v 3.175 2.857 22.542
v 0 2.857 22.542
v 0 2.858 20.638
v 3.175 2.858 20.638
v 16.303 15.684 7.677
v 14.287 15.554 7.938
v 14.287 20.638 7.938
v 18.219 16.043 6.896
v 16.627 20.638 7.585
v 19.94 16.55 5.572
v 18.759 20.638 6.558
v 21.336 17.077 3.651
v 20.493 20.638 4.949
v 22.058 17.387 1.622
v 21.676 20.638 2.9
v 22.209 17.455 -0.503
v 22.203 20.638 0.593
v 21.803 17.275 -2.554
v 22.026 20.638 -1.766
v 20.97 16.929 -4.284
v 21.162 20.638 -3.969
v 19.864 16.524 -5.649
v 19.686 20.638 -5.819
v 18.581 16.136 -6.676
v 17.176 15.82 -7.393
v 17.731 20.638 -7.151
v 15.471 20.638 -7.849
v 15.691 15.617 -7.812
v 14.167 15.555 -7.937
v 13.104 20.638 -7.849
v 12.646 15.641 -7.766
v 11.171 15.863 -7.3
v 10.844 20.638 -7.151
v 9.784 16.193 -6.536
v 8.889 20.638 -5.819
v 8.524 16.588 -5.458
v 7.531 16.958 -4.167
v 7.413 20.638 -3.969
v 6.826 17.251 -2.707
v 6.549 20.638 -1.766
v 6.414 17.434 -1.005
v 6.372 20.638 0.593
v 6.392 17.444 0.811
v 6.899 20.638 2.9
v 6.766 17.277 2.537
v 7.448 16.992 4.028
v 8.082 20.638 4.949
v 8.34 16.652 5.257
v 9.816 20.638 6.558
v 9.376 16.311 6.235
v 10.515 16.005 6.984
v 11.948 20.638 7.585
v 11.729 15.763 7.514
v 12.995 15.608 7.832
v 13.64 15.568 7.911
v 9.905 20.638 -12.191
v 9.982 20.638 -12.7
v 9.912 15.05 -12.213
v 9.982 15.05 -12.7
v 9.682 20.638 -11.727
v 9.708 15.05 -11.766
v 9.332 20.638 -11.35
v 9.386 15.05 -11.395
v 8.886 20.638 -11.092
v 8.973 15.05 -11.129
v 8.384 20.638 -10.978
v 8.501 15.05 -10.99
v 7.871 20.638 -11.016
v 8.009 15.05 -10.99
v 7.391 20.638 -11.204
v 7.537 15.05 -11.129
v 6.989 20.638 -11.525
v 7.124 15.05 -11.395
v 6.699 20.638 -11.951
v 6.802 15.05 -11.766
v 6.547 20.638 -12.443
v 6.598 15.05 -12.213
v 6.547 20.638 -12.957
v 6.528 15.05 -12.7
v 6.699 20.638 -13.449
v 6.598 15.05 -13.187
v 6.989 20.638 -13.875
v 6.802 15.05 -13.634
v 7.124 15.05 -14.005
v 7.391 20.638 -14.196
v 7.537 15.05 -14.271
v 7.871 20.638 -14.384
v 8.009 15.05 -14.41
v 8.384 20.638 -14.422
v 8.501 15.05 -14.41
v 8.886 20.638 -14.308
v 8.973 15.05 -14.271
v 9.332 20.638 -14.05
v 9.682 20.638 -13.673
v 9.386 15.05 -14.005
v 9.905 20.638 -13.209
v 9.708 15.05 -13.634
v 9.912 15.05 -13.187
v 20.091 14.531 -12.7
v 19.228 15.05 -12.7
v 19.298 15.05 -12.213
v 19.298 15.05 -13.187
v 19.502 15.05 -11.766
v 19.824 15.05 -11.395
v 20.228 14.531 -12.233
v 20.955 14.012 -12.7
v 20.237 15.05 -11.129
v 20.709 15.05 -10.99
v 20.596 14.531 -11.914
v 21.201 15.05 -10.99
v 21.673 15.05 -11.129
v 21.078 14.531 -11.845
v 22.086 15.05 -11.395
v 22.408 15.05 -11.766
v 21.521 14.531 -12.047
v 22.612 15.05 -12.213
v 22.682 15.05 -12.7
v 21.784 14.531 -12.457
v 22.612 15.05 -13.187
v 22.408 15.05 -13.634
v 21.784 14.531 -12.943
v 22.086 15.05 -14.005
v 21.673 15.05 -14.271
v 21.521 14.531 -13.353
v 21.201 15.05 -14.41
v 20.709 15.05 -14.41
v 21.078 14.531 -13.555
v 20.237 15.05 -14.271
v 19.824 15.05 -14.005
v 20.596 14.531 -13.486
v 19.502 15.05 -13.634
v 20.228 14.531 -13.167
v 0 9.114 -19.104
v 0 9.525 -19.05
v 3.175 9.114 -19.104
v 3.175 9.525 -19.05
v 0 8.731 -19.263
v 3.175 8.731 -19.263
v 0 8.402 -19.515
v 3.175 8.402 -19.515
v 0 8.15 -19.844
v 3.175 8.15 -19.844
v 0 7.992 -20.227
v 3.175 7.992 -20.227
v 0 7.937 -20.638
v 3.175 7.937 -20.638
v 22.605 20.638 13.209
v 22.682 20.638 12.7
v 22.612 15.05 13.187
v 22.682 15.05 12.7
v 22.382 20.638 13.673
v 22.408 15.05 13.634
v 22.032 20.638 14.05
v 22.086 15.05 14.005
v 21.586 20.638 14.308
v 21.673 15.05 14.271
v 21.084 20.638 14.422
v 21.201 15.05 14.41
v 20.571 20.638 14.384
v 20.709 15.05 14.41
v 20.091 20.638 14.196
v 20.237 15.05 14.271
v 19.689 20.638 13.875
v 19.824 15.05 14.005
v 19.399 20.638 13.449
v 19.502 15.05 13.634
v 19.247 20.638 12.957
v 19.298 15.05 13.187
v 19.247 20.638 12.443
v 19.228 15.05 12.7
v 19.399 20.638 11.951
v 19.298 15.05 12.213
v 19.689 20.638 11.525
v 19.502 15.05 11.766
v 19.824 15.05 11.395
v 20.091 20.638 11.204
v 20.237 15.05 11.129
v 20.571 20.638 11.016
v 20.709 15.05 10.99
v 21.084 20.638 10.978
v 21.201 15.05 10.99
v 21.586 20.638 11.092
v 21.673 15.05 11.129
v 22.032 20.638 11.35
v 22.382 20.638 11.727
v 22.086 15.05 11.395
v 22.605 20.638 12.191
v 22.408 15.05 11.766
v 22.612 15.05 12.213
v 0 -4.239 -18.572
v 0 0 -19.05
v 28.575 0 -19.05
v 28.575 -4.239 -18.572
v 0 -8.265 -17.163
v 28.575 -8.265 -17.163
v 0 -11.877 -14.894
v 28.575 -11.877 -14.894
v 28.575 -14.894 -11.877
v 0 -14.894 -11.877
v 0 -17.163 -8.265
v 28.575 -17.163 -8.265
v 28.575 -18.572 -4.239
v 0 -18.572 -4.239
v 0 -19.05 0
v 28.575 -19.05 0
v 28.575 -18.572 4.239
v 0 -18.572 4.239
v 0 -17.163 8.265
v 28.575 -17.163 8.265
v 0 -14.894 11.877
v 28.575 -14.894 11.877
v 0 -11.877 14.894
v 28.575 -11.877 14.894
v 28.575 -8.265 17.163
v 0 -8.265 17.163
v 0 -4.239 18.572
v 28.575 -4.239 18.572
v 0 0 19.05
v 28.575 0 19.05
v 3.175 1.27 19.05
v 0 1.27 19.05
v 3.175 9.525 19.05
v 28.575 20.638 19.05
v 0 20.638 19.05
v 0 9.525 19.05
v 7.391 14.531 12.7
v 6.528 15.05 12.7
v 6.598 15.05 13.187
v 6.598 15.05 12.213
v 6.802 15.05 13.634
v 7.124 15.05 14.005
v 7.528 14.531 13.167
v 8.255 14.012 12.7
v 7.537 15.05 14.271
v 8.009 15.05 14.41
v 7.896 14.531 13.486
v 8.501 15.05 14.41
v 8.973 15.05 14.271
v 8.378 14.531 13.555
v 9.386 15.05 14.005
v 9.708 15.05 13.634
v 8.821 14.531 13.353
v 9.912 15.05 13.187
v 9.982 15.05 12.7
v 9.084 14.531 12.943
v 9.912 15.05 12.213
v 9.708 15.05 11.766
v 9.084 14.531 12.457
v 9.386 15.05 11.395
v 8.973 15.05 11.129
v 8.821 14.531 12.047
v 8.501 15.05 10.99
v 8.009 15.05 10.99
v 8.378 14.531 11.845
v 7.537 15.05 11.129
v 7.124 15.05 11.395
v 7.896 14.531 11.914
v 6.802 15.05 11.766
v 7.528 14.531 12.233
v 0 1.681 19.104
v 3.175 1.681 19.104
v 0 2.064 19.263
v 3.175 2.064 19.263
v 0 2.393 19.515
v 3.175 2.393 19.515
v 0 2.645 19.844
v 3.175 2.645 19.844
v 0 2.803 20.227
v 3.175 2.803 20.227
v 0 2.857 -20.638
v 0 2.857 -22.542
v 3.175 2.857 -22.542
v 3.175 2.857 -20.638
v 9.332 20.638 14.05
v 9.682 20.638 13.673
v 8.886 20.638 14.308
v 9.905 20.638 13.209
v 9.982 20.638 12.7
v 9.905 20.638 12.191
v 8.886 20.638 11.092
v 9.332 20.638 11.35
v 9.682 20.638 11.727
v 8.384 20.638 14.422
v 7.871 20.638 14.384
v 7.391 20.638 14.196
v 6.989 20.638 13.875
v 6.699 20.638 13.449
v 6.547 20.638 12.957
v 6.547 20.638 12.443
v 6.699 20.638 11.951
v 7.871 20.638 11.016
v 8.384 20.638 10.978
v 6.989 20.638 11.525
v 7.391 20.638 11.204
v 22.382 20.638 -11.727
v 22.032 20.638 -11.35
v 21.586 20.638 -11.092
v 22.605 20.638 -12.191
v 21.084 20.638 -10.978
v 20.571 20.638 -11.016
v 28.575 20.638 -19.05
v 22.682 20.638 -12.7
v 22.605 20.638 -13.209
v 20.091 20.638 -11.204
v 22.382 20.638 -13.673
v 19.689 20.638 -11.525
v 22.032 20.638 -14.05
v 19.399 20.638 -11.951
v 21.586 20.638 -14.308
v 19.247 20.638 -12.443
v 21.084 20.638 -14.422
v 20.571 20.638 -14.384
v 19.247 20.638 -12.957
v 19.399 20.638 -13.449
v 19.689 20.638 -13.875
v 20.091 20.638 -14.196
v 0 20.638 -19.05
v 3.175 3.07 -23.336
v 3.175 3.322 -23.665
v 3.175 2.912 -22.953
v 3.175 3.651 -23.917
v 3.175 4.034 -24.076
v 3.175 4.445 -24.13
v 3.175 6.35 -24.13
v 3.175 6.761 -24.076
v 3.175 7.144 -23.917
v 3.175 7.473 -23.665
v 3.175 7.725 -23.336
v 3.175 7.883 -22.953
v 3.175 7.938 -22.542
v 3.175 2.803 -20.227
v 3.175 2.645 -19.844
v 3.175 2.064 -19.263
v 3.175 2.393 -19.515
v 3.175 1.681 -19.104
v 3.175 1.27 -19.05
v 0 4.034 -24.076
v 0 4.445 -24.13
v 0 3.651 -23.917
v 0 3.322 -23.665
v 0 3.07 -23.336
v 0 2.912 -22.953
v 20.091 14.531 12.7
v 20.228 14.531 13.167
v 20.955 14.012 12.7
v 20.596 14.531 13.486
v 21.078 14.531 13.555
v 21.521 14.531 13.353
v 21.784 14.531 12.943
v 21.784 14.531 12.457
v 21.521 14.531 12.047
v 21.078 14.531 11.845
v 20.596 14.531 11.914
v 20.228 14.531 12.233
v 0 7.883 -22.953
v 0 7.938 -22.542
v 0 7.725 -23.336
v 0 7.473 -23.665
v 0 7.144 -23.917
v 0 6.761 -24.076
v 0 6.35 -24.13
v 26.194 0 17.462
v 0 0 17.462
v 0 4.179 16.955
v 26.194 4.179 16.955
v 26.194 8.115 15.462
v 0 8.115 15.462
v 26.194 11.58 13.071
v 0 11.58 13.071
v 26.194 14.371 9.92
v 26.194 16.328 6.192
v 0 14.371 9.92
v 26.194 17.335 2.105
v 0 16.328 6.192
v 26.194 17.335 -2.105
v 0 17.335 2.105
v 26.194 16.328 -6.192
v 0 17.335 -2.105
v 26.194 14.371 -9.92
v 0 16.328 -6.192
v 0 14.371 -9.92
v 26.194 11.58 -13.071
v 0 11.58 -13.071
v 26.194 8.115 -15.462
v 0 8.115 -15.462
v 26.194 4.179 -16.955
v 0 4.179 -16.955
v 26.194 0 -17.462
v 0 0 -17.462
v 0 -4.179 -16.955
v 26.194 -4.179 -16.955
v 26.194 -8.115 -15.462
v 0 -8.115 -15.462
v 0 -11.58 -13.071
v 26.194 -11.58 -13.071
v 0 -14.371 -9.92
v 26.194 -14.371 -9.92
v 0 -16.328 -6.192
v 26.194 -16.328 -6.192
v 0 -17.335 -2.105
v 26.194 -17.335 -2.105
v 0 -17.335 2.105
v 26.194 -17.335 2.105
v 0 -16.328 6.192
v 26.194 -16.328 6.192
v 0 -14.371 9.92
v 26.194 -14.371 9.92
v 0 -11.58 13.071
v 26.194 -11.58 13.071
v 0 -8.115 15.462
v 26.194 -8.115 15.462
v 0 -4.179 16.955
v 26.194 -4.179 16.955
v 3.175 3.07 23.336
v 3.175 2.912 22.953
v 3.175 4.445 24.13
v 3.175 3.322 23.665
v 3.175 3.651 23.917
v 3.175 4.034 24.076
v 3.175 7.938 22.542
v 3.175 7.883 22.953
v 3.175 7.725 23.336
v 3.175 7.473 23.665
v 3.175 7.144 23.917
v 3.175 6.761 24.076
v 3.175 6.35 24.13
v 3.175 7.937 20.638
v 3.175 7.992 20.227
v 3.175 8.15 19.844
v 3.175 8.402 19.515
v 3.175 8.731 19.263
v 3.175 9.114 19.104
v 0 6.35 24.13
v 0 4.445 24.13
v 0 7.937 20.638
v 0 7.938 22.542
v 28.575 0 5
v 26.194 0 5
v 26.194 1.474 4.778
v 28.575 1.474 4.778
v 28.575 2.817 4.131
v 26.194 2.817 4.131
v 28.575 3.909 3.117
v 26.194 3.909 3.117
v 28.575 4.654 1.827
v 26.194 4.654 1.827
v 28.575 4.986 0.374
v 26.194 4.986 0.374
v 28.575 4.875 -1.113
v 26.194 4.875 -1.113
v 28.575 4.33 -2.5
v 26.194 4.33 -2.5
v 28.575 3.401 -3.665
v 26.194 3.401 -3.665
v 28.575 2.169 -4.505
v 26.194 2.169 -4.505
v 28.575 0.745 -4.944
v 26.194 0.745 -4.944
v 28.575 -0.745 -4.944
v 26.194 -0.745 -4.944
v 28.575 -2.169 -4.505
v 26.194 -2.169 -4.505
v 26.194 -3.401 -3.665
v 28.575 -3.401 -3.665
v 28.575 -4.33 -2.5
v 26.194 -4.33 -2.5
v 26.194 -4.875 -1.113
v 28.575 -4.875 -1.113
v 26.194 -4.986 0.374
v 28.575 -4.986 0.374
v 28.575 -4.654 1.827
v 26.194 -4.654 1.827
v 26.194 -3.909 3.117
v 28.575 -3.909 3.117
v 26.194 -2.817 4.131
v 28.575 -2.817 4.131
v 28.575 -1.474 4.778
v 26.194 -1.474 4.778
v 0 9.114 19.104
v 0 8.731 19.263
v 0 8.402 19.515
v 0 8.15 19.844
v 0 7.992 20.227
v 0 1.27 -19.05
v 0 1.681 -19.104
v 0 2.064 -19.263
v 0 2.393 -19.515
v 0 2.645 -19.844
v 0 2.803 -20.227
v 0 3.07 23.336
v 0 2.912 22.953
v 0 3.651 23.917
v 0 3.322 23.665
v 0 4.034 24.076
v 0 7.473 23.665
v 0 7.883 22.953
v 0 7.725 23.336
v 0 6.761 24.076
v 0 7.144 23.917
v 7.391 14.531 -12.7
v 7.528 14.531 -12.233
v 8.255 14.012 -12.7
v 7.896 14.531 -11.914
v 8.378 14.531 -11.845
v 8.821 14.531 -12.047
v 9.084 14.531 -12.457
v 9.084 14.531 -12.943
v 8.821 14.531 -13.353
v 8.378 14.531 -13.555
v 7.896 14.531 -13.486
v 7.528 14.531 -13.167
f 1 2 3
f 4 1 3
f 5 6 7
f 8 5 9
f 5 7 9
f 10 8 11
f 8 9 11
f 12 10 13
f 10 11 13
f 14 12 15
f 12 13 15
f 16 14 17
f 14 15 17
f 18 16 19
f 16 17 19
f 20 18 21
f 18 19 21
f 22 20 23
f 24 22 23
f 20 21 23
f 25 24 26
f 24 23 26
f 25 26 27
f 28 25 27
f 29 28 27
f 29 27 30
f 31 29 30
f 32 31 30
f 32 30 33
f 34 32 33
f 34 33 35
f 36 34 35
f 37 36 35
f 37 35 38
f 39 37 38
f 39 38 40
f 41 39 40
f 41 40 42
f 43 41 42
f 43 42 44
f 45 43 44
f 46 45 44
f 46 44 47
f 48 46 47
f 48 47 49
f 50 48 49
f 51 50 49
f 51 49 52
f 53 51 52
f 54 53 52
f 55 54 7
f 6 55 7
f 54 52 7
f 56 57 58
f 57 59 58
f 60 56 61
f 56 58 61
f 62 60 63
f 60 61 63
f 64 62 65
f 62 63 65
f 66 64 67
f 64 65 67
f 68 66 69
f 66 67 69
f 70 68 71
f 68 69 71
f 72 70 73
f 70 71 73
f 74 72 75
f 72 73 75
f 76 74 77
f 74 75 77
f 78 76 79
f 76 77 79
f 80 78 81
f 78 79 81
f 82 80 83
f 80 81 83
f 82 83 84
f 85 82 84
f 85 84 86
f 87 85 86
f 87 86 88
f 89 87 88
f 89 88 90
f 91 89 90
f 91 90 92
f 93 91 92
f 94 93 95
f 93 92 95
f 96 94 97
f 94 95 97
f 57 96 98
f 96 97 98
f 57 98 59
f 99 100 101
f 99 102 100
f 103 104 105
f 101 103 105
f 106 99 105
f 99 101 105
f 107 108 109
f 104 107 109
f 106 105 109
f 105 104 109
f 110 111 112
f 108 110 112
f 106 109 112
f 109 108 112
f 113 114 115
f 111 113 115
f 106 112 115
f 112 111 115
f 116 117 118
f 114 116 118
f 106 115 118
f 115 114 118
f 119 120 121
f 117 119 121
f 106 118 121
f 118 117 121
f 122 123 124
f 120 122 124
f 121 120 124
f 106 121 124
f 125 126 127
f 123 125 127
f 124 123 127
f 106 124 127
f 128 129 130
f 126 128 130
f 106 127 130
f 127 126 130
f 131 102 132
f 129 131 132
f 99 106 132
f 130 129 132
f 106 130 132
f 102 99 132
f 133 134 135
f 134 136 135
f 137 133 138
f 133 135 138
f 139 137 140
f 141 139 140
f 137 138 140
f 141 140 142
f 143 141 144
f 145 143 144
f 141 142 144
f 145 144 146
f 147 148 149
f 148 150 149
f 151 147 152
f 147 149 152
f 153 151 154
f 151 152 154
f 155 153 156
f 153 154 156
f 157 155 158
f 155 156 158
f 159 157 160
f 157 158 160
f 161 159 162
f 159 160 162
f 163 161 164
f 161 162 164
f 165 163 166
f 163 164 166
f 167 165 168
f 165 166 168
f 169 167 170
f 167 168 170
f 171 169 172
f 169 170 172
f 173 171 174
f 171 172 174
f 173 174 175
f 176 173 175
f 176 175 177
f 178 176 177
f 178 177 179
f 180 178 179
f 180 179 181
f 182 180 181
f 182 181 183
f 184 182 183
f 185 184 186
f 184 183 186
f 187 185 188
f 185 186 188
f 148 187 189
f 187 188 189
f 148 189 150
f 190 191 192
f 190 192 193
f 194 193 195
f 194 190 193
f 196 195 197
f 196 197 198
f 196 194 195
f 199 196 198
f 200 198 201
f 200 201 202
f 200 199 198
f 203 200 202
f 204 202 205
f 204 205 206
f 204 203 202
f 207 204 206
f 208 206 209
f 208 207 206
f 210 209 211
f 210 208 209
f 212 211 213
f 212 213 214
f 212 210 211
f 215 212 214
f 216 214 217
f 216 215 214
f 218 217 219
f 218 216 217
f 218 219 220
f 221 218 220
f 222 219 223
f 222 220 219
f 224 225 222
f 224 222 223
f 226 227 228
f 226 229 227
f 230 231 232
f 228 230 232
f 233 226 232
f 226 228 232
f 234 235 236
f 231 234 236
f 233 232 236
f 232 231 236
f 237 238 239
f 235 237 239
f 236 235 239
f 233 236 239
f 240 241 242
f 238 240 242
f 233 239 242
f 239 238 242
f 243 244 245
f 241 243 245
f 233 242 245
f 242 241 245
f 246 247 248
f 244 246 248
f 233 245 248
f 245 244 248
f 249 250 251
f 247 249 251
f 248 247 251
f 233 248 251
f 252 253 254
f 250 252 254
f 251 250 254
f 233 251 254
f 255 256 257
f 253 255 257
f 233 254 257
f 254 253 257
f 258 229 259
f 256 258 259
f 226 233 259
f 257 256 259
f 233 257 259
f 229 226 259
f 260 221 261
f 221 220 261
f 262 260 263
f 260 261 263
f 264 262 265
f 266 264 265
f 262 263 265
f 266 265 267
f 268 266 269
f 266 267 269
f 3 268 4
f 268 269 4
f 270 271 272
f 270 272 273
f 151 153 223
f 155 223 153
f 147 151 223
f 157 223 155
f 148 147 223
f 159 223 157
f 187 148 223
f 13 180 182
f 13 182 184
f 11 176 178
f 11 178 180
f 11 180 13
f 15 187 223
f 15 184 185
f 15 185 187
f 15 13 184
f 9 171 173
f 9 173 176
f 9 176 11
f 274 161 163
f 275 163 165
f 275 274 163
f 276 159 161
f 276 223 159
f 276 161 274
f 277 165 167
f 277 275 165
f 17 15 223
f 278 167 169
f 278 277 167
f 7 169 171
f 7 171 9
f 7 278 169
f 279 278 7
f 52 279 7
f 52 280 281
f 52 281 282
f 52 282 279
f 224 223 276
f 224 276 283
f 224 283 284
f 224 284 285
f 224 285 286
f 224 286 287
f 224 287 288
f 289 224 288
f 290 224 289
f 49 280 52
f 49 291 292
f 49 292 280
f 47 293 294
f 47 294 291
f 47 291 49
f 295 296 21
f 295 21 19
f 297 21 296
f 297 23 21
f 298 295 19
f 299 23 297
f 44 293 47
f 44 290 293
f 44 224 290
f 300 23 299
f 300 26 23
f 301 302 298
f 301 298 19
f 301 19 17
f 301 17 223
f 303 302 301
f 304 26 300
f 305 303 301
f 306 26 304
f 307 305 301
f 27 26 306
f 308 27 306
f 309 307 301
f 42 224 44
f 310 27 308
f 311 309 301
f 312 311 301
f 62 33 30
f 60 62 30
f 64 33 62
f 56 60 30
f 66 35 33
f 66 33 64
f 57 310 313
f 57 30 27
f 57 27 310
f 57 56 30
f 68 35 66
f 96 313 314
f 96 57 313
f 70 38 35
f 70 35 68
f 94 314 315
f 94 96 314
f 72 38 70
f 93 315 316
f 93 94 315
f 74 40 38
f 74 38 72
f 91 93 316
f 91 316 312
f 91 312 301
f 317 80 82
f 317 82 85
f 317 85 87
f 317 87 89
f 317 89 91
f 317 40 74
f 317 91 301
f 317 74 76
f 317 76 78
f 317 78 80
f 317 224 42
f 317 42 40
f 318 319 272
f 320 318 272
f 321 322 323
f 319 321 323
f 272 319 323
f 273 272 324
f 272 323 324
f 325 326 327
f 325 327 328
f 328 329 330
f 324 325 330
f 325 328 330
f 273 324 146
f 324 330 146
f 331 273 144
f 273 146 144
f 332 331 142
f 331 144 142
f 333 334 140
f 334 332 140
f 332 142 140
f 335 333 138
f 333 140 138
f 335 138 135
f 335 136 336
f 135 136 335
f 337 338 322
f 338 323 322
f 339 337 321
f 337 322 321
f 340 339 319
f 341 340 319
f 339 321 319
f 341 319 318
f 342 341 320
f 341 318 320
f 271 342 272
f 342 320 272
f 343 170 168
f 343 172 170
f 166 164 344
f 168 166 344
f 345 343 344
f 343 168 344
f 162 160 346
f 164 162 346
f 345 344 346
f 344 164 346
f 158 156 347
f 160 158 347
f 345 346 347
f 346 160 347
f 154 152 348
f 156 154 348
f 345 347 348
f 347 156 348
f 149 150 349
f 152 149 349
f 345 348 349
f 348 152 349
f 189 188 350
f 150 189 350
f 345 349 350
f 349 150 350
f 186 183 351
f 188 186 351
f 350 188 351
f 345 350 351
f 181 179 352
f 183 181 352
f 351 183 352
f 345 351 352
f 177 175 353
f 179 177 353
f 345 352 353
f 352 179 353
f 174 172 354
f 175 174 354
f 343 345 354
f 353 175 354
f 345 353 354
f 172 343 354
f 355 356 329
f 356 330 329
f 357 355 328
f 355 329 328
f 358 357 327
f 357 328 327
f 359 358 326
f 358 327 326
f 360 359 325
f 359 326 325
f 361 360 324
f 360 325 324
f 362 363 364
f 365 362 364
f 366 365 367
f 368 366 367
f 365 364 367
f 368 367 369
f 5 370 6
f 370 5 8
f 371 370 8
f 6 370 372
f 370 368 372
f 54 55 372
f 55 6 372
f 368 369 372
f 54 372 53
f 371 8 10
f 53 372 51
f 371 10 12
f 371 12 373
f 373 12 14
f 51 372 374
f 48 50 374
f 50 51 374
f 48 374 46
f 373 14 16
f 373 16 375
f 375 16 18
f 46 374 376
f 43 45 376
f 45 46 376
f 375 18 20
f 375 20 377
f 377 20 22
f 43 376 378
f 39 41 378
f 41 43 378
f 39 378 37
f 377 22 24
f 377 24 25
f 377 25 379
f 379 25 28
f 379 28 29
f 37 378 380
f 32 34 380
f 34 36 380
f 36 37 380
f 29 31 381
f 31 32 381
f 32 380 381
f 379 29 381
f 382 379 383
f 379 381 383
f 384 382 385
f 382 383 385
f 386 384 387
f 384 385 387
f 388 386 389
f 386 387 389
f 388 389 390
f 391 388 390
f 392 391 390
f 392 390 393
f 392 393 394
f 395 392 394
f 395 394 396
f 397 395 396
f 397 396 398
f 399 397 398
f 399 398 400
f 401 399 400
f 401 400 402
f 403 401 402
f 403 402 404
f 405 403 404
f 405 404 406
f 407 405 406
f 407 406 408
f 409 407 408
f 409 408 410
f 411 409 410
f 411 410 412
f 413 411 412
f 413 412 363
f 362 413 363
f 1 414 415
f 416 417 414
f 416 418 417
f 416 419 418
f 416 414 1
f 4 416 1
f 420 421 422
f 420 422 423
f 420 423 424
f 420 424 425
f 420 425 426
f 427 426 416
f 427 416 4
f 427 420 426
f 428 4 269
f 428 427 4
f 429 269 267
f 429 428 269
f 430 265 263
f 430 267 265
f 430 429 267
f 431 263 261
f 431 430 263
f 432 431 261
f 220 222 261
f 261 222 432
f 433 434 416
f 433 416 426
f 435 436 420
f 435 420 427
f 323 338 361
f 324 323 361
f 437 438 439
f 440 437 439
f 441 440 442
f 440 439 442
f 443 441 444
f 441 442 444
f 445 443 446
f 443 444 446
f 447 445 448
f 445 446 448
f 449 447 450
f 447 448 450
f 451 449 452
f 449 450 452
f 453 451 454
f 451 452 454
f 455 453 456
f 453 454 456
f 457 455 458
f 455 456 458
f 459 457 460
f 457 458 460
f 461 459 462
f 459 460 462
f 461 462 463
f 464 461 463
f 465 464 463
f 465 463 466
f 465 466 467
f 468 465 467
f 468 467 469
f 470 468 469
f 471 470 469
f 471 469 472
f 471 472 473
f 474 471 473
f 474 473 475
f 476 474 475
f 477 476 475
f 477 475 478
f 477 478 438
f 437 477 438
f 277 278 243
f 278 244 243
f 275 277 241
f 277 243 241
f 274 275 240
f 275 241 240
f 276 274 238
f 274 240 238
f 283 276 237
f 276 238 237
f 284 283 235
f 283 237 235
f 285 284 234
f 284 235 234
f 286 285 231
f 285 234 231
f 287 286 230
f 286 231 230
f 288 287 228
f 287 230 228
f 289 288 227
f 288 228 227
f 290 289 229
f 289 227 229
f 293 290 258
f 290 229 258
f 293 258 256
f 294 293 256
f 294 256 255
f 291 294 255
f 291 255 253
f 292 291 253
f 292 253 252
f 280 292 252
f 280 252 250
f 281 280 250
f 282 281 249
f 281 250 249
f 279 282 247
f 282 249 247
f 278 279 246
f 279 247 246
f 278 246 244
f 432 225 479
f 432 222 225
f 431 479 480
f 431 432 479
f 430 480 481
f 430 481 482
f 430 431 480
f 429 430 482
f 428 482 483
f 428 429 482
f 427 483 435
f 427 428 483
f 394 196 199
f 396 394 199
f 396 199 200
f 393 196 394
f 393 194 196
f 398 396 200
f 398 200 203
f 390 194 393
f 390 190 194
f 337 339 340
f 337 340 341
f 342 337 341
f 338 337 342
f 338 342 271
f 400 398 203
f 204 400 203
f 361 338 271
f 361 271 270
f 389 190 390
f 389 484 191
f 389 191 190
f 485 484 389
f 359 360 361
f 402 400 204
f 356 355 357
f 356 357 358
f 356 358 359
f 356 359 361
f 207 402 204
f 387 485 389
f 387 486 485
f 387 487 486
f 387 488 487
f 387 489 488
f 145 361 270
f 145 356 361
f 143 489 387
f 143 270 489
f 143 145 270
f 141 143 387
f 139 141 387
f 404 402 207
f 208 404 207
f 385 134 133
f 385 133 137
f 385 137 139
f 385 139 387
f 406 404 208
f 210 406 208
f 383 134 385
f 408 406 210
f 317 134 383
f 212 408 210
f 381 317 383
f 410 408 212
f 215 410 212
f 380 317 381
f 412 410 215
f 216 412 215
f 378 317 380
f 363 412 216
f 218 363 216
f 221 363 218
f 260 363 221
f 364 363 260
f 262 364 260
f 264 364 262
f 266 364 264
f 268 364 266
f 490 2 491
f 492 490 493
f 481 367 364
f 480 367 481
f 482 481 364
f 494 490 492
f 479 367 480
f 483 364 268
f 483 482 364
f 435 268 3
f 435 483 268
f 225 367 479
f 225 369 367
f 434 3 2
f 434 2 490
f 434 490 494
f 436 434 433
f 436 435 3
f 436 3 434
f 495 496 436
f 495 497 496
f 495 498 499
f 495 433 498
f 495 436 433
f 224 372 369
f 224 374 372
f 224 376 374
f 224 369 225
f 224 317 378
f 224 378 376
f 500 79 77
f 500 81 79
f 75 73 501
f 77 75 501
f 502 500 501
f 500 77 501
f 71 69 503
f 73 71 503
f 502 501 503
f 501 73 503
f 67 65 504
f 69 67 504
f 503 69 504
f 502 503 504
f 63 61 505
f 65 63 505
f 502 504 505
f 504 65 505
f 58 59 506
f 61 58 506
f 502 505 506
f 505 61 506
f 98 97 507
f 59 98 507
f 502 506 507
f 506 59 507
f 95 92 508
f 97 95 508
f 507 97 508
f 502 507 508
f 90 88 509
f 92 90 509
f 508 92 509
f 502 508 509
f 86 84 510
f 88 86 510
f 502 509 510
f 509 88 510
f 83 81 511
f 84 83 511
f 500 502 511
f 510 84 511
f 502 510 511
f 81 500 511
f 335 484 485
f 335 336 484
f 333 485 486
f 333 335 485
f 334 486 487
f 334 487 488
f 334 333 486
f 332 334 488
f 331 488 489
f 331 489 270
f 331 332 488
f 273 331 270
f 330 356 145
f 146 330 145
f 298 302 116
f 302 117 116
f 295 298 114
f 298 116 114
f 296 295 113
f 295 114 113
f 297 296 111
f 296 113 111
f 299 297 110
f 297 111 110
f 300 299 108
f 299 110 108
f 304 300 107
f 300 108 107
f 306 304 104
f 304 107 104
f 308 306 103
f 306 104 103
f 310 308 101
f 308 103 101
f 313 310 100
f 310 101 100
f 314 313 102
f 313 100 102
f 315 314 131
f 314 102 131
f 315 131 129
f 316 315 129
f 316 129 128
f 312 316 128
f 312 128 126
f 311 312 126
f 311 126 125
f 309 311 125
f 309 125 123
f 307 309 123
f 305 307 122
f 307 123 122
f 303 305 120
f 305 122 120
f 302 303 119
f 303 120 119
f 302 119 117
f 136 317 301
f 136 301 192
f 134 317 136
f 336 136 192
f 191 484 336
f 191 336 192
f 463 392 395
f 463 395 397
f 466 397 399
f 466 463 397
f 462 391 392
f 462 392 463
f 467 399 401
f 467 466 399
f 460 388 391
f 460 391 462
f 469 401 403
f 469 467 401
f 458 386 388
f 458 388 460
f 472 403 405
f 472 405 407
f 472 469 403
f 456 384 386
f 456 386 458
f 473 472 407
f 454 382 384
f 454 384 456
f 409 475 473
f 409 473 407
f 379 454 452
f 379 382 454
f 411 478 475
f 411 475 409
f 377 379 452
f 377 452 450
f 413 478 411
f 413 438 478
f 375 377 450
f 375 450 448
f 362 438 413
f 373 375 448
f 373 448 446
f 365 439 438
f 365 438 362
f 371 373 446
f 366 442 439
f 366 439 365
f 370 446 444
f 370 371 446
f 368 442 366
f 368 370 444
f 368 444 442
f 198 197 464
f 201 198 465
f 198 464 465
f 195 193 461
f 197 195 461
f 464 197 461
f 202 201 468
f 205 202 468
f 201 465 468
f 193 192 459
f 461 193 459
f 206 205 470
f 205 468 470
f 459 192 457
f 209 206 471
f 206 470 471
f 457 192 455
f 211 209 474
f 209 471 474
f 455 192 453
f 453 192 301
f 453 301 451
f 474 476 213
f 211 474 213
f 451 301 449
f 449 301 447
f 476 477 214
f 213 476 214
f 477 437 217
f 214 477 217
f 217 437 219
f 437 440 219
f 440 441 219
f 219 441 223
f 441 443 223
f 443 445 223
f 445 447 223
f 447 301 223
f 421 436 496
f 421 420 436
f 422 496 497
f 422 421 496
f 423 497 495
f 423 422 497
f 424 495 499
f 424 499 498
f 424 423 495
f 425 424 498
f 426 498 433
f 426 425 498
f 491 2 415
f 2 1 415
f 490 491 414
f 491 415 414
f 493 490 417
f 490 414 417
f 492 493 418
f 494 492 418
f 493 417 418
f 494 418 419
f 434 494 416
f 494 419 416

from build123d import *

# Parameters (mm, degrees)
BOSS_EXTRUDE1_DEPTH       = 28.575
SKETCH2_R                 = 17.4625
CUT_EXTRUDE1_DEPTH        = 26.19375
SKETCH3_R                 = 5
CUT_EXTRUDE2_DEPTH        = 39.404706031
F_8_32_TAPPED_HOLE1_D     = 3.4544
F_8_32_TAPPED_HOLE1_DEPTH = 5.588
F_8_32_TAPPED_HOLE1_TIP   = 1.037806461
SKETCH6_W                 = 5.08
SKETCH6_H                 = 5.08
BOSS_EXTRUDE2_DEPTH       = 3.175
FILLET1_R                 = 1.5875
CUT_EXTRUDE3_REACH        = 56.533
CUT_EXTRUDE3_END_RADIUS   = 17.4625
SKETCH7_R                 = 7.9375


with BuildPart() as part:
    # Sketch1 → Boss-Extrude1 (new body)
    with BuildSketch(Plane(origin=(0, 0, 0), x_dir=(0, 0, -1), z_dir=(1, 0, 0))):
        with BuildLine():
            Line((-19.05, 0), (-19.05, 20.6375))
            Line((-19.05, 20.6375), (19.05, 20.6375))
            Line((19.05, 20.6375), (19.05, 0))
            ThreePointArc((19.05, 0), (0, -19.05), (-19.05, 0))
        make_face()
    extrude(amount=BOSS_EXTRUDE1_DEPTH)

    # Sketch2 → Cut-Extrude1 (cut)
    with BuildSketch(Plane.ZY):
        Circle(SKETCH2_R)
    extrude(amount=-CUT_EXTRUDE1_DEPTH, mode=Mode.SUBTRACT)

    # Sketch3 → Cut-Extrude2 (cut, through all)
    with BuildSketch(Plane.ZY.offset(-26.19375)):
        Circle(SKETCH3_R)
    extrude(amount=-CUT_EXTRUDE2_DEPTH, mode=Mode.SUBTRACT)

    # #8-32 Tapped Hole1
    with Locations(Plane(origin=(0, 20.6375, 0), x_dir=(-1, 0, 0), z_dir=(0, 1, 0))):
        with Locations((-8.255, 12.7), (-8.255, -12.7), (-20.955, -12.7), (-20.955, 12.7), (-34.258152115, 14.428229267)):
            Hole(F_8_32_TAPPED_HOLE1_D / 2, depth=F_8_32_TAPPED_HOLE1_DEPTH)
            with Locations((0, 0, -(F_8_32_TAPPED_HOLE1_DEPTH + F_8_32_TAPPED_HOLE1_TIP / 2))):  # 118° drill point
                Cone(0, F_8_32_TAPPED_HOLE1_D / 2, F_8_32_TAPPED_HOLE1_TIP, mode=Mode.SUBTRACT)

    # Sketch6 → Boss-Extrude2 (add)
    with BuildSketch(Plane.ZY):
        with Locations((-21.59, 5.3975)):
            Rectangle(SKETCH6_W, SKETCH6_H)
    boss_extrude2 = extrude(amount=-BOSS_EXTRUDE2_DEPTH)

    # Mirror1: Boss-Extrude2 across plane
    add(boss_extrude2.mirror(Plane.XY))

    # Fillet1
    fillet1_edges = [part.edges().sort_by_distance(p)[0] for p in [
        (1.5875, 7.9375, -19.05),
        (1.5875, 2.8575, -19.05),
        (1.5875, 2.8575, -24.13),
        (1.5875, 7.9375, -24.13),
        (1.5875, 2.8575, 19.05),
        (1.5875, 7.9375, 19.05),
        (1.5875, 7.9375, 24.13),
        (1.5875, 2.8575, 24.13),
    ]]
    fillet(fillet1_edges, radius=FILLET1_R)

    # Cut-Extrude3: up to this cylinder (the profile starts outside it)
    cut_extrude3_end = Plane(origin=(14.2875, 0, 0), z_dir=(-1, 0, 0)) * Cylinder(CUT_EXTRUDE3_END_RADIUS, 148.991, mode=Mode.PRIVATE)
    # Sketch7 → Cut-Extrude3 (cut, up to the surface)
    with BuildSketch(Plane(origin=(0, 20.6375, 0), x_dir=(1, 0, 0), z_dir=(0, 1, 0)), mode=Mode.PRIVATE) as cut_extrude3_sk1:
        with Locations(Location((14.2875, 0, 0), (0, 0, 270))):
            Circle(SKETCH7_R)
    cut_extrude3_tool1 = extrude(cut_extrude3_sk1.sketch, amount=-CUT_EXTRUDE3_REACH, mode=Mode.PRIVATE) - cut_extrude3_end
    add(cut_extrude3_tool1.solids().sort_by_distance((14.2875, 20.6375, 0))[0], mode=Mode.SUBTRACT)


solid = part.part
